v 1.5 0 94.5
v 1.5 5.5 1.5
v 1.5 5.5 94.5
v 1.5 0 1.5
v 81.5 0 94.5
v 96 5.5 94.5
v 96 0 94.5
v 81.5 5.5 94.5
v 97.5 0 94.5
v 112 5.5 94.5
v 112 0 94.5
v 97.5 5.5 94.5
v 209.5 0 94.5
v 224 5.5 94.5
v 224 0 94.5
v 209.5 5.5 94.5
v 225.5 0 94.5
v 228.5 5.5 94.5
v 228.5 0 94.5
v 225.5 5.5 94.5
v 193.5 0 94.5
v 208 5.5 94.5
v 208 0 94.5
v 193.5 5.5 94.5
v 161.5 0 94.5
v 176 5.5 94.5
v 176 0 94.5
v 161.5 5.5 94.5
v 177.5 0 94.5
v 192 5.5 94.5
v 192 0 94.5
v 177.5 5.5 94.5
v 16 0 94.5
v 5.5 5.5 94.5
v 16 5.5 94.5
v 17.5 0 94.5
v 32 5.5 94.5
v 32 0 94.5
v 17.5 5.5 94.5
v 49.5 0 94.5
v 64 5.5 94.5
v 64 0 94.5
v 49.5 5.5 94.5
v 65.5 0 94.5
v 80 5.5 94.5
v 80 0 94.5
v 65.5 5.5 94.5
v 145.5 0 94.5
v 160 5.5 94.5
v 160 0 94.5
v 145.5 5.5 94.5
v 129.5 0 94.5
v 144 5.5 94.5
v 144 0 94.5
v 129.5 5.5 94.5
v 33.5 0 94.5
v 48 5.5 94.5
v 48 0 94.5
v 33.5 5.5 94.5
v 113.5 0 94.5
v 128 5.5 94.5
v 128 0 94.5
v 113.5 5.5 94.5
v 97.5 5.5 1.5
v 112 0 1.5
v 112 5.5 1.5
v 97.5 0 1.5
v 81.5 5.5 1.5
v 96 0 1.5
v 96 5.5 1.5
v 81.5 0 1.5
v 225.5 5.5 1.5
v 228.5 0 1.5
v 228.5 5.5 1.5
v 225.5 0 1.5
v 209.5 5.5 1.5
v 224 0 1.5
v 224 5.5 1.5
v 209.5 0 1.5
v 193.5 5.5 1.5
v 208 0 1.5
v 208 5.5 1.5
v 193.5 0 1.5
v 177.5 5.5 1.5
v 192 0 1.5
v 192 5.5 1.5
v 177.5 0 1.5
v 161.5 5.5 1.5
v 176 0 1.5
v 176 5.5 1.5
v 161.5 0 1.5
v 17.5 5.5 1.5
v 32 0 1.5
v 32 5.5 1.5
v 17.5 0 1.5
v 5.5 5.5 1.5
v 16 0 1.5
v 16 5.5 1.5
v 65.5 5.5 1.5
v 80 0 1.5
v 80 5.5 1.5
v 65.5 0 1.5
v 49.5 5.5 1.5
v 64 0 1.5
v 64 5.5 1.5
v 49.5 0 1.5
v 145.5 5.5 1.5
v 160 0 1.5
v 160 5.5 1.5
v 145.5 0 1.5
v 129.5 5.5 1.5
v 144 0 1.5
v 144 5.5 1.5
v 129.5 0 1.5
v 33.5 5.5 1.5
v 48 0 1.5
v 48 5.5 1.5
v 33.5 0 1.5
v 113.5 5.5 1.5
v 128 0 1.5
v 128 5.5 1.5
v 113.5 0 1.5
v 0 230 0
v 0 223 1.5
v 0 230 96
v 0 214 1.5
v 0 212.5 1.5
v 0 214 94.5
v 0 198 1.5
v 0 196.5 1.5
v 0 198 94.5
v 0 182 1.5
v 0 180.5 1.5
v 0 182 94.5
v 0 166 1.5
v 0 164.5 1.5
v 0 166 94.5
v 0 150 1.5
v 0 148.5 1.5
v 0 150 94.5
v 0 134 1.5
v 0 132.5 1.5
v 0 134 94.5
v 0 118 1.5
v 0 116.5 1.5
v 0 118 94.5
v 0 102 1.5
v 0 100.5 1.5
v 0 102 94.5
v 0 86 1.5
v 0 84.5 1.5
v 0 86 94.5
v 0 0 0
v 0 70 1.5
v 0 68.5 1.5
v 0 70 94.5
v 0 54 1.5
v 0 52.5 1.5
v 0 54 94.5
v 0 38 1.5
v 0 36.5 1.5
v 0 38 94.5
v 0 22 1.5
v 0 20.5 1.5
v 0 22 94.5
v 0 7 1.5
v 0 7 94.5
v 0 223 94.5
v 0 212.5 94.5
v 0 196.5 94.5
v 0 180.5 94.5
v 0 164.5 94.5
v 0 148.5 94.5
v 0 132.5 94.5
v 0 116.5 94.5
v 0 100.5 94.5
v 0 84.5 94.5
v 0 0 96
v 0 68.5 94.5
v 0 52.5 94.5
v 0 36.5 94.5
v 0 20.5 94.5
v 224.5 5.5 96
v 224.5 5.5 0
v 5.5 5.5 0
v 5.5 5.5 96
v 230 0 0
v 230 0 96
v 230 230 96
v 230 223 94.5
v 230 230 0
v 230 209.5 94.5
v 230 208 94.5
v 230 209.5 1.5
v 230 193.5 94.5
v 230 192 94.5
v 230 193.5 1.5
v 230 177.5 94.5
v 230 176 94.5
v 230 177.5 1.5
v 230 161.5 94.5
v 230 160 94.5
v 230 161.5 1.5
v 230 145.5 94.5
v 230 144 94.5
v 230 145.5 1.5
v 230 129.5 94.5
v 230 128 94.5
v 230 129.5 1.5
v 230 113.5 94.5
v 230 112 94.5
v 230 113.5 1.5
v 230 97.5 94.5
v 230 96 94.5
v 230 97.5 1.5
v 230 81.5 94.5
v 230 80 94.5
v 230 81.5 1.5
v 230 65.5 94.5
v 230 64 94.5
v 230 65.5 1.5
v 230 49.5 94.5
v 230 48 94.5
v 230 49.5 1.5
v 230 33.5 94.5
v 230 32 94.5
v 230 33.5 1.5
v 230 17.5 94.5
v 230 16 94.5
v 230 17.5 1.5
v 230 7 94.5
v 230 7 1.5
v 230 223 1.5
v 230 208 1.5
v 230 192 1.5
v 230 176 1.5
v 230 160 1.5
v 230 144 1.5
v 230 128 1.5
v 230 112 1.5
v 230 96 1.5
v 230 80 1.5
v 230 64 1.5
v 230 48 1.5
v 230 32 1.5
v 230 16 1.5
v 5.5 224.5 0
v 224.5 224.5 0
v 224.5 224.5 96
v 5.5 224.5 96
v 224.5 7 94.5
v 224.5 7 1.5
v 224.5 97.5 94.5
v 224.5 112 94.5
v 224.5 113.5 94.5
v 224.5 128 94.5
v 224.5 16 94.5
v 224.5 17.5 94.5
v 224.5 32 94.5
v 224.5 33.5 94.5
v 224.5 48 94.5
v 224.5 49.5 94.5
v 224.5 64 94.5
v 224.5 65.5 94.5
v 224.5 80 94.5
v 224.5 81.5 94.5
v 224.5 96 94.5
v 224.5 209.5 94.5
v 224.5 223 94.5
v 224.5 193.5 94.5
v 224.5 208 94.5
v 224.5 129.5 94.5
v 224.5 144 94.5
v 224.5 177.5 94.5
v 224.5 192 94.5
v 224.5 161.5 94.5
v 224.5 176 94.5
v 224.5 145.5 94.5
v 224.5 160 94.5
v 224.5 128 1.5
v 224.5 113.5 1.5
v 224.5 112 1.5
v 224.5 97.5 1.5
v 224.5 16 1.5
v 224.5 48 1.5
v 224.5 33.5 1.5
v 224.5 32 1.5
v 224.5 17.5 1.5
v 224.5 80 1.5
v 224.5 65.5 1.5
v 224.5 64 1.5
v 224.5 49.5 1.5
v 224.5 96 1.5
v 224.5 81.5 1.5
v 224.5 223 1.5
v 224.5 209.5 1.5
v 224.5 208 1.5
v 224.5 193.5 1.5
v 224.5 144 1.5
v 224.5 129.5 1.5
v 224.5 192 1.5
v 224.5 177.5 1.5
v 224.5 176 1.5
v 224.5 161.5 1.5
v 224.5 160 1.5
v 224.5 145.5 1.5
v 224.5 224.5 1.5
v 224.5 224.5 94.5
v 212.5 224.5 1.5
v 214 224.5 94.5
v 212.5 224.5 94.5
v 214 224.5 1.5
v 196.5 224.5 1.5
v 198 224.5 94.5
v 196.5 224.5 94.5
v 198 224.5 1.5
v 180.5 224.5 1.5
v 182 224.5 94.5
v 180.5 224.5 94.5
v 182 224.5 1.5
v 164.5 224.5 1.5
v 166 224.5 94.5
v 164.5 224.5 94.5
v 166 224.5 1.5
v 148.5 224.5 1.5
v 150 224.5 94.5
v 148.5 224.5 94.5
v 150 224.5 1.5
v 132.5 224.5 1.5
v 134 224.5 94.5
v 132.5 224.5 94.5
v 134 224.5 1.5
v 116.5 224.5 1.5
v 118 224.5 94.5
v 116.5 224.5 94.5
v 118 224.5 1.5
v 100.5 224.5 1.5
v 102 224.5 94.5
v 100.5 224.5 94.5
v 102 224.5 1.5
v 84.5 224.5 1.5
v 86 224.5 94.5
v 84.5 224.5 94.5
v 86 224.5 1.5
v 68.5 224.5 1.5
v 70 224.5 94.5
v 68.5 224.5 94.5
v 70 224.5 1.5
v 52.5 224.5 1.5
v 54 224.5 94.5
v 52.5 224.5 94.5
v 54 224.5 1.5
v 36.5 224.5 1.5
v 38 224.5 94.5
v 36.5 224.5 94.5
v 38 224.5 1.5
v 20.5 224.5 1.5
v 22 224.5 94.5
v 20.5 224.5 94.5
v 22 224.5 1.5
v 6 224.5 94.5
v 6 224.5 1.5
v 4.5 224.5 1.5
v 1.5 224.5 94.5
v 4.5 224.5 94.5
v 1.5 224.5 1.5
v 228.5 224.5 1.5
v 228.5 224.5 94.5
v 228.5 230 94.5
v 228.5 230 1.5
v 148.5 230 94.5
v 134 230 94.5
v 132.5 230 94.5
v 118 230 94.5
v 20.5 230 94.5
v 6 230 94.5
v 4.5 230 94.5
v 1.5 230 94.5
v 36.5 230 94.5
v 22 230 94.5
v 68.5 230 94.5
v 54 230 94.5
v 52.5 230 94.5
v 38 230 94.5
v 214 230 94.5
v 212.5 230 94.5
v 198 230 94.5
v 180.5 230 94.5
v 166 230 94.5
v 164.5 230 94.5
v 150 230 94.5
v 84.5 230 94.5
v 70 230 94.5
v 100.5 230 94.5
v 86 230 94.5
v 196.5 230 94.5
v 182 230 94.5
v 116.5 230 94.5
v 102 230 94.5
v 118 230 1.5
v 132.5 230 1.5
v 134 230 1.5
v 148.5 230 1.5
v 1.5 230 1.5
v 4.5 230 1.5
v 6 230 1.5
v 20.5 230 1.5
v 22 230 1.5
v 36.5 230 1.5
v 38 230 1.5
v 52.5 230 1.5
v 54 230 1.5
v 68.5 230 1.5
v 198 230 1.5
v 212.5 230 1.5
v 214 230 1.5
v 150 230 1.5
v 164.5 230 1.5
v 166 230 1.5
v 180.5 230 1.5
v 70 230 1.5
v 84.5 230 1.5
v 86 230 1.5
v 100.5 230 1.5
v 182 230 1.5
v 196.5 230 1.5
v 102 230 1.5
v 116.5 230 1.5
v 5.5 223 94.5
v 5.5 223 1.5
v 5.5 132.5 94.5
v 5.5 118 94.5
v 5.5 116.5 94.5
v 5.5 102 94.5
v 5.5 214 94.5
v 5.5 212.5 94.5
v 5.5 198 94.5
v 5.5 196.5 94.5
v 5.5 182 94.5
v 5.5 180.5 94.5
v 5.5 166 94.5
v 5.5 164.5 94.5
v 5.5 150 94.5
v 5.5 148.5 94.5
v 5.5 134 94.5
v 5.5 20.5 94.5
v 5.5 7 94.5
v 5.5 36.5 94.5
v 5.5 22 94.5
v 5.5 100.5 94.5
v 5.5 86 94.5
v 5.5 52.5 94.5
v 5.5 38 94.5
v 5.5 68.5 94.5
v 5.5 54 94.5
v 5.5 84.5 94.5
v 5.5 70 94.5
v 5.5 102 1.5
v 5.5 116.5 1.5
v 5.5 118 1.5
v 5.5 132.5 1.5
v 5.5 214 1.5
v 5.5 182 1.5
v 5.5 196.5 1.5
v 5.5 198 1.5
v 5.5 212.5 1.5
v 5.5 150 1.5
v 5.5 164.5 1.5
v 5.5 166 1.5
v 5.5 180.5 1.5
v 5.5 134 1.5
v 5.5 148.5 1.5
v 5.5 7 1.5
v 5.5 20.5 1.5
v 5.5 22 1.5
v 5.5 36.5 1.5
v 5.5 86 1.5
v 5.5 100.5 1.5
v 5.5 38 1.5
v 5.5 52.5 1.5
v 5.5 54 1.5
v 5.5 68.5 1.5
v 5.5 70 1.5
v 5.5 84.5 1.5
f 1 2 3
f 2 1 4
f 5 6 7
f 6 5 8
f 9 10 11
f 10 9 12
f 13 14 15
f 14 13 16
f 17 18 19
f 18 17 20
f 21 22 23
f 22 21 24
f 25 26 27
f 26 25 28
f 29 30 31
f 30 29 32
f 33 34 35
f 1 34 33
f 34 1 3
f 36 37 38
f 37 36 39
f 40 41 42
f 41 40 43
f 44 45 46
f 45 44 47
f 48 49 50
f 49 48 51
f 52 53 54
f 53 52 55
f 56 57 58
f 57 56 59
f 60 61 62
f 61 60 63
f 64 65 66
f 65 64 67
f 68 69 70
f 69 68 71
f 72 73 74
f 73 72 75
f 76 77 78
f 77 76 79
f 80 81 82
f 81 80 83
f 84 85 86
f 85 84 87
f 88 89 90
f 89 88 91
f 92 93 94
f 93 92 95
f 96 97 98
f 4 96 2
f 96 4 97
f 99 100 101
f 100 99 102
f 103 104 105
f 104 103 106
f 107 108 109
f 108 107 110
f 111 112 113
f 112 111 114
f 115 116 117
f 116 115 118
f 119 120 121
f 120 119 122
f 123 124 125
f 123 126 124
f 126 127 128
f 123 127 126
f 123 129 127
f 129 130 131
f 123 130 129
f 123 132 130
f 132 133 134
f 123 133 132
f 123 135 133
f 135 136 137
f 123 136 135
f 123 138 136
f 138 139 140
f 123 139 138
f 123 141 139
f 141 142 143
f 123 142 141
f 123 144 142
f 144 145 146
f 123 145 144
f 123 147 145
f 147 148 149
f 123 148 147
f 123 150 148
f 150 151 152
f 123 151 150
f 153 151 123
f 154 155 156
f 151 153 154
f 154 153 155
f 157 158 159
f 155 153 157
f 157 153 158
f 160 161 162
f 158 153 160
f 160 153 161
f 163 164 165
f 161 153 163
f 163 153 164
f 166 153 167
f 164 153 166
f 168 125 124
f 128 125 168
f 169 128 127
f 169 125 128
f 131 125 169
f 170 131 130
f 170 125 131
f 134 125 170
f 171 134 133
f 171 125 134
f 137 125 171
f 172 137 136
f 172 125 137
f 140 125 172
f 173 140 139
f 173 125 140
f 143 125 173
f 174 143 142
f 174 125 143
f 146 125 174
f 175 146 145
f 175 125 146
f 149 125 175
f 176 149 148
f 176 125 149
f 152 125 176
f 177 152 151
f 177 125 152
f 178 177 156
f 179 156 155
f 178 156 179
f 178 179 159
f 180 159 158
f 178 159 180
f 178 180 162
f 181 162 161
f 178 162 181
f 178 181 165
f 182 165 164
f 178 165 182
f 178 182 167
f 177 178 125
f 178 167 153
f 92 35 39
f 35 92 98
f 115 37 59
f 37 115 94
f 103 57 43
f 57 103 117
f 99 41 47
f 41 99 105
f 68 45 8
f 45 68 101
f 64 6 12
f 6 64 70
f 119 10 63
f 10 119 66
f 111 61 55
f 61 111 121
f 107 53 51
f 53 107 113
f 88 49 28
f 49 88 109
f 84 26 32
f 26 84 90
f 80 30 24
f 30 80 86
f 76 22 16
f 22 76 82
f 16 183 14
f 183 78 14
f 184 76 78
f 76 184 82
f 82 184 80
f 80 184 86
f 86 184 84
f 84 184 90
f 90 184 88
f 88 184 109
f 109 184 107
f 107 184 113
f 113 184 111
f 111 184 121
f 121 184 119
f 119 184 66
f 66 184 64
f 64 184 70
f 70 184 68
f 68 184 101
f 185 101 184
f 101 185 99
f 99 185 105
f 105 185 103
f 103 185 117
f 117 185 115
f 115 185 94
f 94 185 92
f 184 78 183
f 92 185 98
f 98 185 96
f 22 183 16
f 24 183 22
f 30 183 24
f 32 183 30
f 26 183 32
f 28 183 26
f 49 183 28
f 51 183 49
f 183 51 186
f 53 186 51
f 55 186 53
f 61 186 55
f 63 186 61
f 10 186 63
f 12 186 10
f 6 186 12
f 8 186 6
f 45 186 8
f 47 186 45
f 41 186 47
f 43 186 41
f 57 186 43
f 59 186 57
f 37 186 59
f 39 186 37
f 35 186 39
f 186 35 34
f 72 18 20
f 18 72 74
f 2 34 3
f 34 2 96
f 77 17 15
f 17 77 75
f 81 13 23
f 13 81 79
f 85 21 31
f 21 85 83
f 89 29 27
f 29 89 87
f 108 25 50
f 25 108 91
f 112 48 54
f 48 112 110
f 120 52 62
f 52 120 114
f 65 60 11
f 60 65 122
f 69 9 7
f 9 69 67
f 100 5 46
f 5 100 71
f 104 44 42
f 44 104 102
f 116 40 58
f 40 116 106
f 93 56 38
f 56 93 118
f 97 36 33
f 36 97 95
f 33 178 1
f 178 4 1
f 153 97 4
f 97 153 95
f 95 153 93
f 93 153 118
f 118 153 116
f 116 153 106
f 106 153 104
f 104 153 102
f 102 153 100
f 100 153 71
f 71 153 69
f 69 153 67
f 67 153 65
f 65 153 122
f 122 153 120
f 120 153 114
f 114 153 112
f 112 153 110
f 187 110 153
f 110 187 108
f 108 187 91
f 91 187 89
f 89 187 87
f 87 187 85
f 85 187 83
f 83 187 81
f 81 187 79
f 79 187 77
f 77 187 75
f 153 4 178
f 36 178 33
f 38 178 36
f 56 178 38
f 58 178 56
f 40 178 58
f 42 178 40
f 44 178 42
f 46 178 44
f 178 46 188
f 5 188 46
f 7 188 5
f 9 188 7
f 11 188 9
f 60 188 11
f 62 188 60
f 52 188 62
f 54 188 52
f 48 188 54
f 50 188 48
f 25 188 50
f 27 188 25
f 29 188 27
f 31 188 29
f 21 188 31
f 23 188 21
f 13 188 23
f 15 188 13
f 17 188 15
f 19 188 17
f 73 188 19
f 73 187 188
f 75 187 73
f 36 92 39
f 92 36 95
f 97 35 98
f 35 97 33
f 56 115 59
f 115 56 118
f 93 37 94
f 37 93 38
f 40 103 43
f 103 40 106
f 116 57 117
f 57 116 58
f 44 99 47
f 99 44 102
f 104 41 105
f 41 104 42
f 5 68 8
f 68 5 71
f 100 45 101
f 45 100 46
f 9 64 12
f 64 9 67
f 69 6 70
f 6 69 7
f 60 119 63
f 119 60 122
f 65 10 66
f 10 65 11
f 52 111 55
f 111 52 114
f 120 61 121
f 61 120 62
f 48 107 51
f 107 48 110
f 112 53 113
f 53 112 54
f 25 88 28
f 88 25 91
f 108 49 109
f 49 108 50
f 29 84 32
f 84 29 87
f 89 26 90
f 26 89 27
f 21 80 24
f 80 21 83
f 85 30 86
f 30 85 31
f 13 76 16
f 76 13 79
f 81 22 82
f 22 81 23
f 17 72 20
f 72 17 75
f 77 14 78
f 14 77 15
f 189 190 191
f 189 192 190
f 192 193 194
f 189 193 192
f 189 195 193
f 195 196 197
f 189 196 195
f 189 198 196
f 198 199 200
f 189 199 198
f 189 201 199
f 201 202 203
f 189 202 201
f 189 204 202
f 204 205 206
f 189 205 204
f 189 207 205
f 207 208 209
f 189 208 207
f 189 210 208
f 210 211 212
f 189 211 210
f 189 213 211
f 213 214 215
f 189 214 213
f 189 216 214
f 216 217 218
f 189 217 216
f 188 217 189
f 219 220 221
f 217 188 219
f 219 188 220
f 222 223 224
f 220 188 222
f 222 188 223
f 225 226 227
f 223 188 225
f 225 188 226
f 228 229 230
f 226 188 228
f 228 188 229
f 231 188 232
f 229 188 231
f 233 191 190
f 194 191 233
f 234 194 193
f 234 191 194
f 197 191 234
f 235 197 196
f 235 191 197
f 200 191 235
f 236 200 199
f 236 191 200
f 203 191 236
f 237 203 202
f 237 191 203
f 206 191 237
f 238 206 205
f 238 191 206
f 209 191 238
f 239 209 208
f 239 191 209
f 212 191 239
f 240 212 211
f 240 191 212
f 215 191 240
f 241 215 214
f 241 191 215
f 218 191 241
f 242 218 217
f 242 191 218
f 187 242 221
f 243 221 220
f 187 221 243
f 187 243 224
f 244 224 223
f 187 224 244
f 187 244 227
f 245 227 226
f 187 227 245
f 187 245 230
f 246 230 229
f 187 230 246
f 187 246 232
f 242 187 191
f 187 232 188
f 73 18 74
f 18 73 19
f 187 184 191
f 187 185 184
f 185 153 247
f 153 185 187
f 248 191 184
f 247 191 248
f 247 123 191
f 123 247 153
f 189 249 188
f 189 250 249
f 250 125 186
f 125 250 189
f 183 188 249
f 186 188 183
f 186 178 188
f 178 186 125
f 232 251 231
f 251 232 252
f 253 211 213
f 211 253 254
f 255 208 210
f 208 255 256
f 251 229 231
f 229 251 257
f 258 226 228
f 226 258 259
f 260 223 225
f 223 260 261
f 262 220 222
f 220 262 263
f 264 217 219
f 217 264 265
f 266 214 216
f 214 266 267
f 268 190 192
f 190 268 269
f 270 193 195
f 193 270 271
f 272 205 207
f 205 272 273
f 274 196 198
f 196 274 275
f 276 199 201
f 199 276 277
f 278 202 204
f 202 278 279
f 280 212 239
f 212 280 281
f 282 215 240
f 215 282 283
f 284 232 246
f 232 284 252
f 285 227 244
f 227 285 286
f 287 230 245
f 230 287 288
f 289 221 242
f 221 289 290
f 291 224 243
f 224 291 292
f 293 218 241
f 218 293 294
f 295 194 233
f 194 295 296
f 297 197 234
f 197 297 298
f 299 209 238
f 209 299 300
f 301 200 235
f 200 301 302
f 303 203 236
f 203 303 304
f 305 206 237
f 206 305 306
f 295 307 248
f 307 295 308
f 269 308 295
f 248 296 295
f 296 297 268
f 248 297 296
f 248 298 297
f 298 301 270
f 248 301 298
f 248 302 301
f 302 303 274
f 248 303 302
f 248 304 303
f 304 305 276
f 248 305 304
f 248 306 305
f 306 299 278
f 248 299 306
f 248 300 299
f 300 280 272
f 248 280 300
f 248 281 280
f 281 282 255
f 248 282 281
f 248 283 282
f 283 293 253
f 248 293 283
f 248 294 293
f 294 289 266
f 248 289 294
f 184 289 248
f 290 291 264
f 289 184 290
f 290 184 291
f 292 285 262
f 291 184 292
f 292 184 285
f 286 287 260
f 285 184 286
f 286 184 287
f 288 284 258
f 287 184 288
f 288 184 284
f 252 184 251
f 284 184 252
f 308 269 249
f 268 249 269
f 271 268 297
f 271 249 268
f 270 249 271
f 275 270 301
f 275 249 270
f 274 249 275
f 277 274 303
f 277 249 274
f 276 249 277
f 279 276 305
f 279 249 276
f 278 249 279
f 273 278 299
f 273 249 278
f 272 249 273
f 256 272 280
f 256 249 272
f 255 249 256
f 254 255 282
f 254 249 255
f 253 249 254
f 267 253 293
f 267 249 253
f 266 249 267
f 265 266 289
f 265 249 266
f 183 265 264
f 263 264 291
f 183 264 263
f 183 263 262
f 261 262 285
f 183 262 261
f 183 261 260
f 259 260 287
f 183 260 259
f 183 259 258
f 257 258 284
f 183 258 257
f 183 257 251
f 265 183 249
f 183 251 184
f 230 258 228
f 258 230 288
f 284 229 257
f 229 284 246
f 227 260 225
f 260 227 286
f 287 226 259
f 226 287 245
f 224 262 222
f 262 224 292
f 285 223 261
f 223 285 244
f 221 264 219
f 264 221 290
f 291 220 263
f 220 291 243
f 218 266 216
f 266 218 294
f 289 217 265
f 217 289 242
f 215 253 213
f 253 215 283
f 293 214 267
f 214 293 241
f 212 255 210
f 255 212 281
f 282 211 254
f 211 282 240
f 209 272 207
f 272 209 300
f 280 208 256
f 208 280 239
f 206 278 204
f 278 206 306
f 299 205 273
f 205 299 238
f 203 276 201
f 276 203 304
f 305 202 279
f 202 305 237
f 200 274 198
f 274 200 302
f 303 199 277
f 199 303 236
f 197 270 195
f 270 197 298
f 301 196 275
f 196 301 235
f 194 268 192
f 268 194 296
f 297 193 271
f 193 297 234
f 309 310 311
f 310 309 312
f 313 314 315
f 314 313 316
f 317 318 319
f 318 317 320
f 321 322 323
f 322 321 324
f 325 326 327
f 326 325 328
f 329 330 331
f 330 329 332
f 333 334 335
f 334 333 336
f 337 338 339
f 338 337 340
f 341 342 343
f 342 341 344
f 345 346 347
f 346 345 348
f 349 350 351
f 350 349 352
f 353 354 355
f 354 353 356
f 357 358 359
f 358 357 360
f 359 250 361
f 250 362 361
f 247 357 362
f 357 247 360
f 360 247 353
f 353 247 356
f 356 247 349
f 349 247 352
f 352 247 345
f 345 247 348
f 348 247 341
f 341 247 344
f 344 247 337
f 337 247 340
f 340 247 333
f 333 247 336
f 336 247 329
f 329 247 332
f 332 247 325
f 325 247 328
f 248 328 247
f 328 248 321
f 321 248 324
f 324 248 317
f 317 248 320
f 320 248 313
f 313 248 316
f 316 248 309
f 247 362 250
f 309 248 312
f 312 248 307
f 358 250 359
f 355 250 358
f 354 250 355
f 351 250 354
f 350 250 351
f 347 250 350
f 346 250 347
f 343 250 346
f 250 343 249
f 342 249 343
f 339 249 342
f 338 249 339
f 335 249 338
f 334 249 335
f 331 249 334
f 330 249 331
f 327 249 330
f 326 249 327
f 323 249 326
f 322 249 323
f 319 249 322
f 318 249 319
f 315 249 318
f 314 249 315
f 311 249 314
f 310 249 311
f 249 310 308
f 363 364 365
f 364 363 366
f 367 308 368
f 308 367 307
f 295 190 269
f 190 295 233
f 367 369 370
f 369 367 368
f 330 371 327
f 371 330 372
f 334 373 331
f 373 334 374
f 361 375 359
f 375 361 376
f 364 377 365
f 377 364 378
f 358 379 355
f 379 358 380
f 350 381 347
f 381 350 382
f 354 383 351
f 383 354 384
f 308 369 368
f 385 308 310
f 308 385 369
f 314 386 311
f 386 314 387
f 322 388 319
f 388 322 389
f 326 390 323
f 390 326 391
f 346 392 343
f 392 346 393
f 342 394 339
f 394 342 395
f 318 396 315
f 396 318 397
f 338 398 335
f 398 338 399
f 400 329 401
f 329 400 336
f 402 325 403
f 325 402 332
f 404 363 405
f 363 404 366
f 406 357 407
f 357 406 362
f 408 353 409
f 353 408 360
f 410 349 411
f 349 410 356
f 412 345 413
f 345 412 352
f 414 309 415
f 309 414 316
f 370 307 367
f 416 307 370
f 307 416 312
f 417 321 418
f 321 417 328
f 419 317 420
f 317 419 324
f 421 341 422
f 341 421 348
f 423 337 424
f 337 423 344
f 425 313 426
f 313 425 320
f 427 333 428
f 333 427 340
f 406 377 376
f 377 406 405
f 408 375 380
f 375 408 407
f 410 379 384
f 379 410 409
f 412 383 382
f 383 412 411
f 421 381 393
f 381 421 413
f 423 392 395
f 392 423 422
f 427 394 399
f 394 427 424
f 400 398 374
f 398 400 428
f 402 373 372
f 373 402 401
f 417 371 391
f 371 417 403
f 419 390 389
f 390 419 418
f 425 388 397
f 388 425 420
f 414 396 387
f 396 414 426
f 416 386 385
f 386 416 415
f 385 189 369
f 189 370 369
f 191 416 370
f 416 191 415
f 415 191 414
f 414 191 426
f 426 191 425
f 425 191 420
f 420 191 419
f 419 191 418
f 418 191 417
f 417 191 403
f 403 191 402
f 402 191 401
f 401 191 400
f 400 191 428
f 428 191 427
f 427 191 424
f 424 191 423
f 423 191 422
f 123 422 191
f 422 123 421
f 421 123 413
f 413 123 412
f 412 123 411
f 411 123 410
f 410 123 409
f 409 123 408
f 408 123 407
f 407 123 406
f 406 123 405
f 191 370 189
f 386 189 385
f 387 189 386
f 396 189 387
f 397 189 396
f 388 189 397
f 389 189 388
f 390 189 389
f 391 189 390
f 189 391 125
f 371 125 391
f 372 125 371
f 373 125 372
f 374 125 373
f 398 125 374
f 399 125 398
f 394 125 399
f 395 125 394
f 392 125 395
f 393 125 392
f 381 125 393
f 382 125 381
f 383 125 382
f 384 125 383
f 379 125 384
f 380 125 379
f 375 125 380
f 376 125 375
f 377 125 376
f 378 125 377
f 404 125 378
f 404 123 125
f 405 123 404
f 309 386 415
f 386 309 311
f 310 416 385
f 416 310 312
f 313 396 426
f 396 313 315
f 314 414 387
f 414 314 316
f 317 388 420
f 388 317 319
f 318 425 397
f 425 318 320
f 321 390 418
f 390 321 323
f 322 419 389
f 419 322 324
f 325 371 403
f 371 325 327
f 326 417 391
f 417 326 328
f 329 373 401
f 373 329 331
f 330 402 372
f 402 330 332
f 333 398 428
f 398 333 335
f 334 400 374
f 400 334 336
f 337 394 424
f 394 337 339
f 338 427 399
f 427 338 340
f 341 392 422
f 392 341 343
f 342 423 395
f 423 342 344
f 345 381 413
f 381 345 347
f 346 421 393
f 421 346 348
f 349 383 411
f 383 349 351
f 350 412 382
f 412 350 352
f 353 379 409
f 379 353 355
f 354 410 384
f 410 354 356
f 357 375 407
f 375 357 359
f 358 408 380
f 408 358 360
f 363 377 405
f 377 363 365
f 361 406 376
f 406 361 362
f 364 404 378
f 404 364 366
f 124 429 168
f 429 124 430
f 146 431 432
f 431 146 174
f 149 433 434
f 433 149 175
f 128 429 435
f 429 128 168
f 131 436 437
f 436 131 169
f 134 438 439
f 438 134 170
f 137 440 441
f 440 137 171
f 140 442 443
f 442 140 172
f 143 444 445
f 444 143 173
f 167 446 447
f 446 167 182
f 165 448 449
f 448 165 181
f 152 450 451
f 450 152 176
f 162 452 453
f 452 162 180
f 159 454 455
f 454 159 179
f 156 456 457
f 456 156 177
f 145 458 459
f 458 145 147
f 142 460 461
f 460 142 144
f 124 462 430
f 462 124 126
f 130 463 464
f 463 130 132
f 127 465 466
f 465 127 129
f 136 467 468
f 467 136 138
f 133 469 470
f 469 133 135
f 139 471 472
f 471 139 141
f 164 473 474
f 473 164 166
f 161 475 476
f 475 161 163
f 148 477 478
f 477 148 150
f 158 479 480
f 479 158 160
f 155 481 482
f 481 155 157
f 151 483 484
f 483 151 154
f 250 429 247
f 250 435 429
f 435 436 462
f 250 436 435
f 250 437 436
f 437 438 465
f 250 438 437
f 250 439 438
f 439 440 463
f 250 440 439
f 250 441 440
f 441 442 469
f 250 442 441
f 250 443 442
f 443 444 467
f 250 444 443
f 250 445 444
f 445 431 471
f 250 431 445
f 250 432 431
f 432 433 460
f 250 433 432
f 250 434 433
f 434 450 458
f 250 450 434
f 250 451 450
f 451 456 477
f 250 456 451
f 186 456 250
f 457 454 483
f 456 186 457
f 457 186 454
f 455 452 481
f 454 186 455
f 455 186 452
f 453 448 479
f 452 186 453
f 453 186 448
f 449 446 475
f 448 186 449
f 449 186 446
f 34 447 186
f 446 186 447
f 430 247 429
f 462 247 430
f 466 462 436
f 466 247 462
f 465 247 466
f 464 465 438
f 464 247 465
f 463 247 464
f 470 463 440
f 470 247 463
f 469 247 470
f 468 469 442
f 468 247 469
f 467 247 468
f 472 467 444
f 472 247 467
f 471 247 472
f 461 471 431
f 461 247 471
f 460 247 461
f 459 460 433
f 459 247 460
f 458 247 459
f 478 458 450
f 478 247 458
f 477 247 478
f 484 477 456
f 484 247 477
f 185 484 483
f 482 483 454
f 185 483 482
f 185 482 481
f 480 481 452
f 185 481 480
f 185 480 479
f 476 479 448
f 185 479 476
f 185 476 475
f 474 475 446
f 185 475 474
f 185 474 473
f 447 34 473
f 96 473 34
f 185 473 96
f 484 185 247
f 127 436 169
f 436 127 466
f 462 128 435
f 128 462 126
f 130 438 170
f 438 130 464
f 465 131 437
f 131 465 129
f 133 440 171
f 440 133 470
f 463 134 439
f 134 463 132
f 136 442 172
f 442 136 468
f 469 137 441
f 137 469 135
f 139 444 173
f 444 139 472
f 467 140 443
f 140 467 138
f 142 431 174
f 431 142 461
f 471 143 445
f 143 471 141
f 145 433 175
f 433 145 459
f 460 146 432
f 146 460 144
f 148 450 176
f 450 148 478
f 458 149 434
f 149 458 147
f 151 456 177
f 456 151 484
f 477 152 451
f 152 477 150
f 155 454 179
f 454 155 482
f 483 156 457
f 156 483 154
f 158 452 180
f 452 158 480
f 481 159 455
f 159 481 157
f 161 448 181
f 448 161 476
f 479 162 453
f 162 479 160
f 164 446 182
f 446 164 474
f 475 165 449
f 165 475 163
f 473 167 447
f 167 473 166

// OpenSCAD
$fn = 48;

color(c = [0.8500000000, 0.7000000000, 0.4500000000]) {
	translate(v = [0, 0, 0]) {
		rotate(a = 0) {
			translate(v = [0, 0, 1.5000000000]) {
				cube(size = [1.5000000000, 5.5000000000, 93.0000000000]);
			}
			translate(v = [16, 0, 1.5000000000]) {
				cube(size = [1.5000000000, 5.5000000000, 93.0000000000]);
			}
			translate(v = [32, 0, 1.5000000000]) {
				cube(size = [1.5000000000, 5.5000000000, 93.0000000000]);
			}
			translate(v = [48, 0, 1.5000000000]) {
				cube(size = [1.5000000000, 5.5000000000, 93.0000000000]);
			}
			translate(v = [64, 0, 1.5000000000]) {
				cube(size = [1.5000000000, 5.5000000000, 93.0000000000]);
			}
			translate(v = [80, 0, 1.5000000000]) {
				cube(size = [1.5000000000, 5.5000000000, 93.0000000000]);
			}
			translate(v = [96, 0, 1.5000000000]) {
				cube(size = [1.5000000000, 5.5000000000, 93.0000000000]);
			}
			translate(v = [112, 0, 1.5000000000]) {
				cube(size = [1.5000000000, 5.5000000000, 93.0000000000]);
			}
			translate(v = [128, 0, 1.5000000000]) {
				cube(size = [1.5000000000, 5.5000000000, 93.0000000000]);
			}
			translate(v = [144, 0, 1.5000000000]) {
				cube(size = [1.5000000000, 5.5000000000, 93.0000000000]);
			}
			translate(v = [160, 0, 1.5000000000]) {
				cube(size = [1.5000000000, 5.5000000000, 93.0000000000]);
			}
			translate(v = [176, 0, 1.5000000000]) {
				cube(size = [1.5000000000, 5.5000000000, 93.0000000000]);
			}
			translate(v = [192, 0, 1.5000000000]) {
				cube(size = [1.5000000000, 5.5000000000, 93.0000000000]);
			}
			translate(v = [208, 0, 1.5000000000]) {
				cube(size = [1.5000000000, 5.5000000000, 93.0000000000]);
			}
			translate(v = [224, 0, 1.5000000000]) {
				cube(size = [1.5000000000, 5.5000000000, 93.0000000000]);
			}
			translate(v = [228.5000000000, 0, 1.5000000000]) {
				cube(size = [1.5000000000, 5.5000000000, 93.0000000000]);
			}
			translate(v = [0.0000000000, 0, 0]) {
				cube(size = [230.0000000000, 5.5000000000, 1.5000000000]);
			}
			translate(v = [0.0000000000, 0, 94.5000000000]) {
				cube(size = [230.0000000000, 5.5000000000, 1.5000000000]);
			}
		}
	}
}
color(c = [0.8500000000, 0.7000000000, 0.4500000000]) {
	translate(v = [230, 0, 0]) {
		rotate(a = 90) {
			translate(v = [5.5000000000, 0, 1.5000000000]) {
				cube(size = [1.5000000000, 5.5000000000, 93.0000000000]);
			}
			translate(v = [16, 0, 1.5000000000]) {
				cube(size = [1.5000000000, 5.5000000000, 93.0000000000]);
			}
			translate(v = [32, 0, 1.5000000000]) {
				cube(size = [1.5000000000, 5.5000000000, 93.0000000000]);
			}
			translate(v = [48, 0, 1.5000000000]) {
				cube(size = [1.5000000000, 5.5000000000, 93.0000000000]);
			}
			translate(v = [64, 0, 1.5000000000]) {
				cube(size = [1.5000000000, 5.5000000000, 93.0000000000]);
			}
			translate(v = [80, 0, 1.5000000000]) {
				cube(size = [1.5000000000, 5.5000000000, 93.0000000000]);
			}
			translate(v = [96, 0, 1.5000000000]) {
				cube(size = [1.5000000000, 5.5000000000, 93.0000000000]);
			}
			translate(v = [112, 0, 1.5000000000]) {
				cube(size = [1.5000000000, 5.5000000000, 93.0000000000]);
			}
			translate(v = [128, 0, 1.5000000000]) {
				cube(size = [1.5000000000, 5.5000000000, 93.0000000000]);
			}
			translate(v = [144, 0, 1.5000000000]) {
				cube(size = [1.5000000000, 5.5000000000, 93.0000000000]);
			}
			translate(v = [160, 0, 1.5000000000]) {
				cube(size = [1.5000000000, 5.5000000000, 93.0000000000]);
			}
			translate(v = [176, 0, 1.5000000000]) {
				cube(size = [1.5000000000, 5.5000000000, 93.0000000000]);
			}
			translate(v = [192, 0, 1.5000000000]) {
				cube(size = [1.5000000000, 5.5000000000, 93.0000000000]);
			}
			translate(v = [208, 0, 1.5000000000]) {
				cube(size = [1.5000000000, 5.5000000000, 93.0000000000]);
			}
			translate(v = [223.0000000000, 0, 1.5000000000]) {
				cube(size = [1.5000000000, 5.5000000000, 93.0000000000]);
			}
			translate(v = [5.5000000000, 0, 0]) {
				cube(size = [219.0000000000, 5.5000000000, 1.5000000000]);
			}
			translate(v = [5.5000000000, 0, 94.5000000000]) {
				cube(size = [219.0000000000, 5.5000000000, 1.5000000000]);
			}
		}
	}
}
color(c = [0.8500000000, 0.7000000000, 0.4500000000]) {
	translate(v = [230, 230, 0]) {
		rotate(a = 180) {
			translate(v = [0, 0, 1.5000000000]) {
				cube(size = [1.5000000000, 5.5000000000, 93.0000000000]);
			}
			translate(v = [16, 0, 1.5000000000]) {
				cube(size = [1.5000000000, 5.5000000000, 93.0000000000]);
			}
			translate(v = [32, 0, 1.5000000000]) {
				cube(size = [1.5000000000, 5.5000000000, 93.0000000000]);
			}
			translate(v = [48, 0, 1.5000000000]) {
				cube(size = [1.5000000000, 5.5000000000, 93.0000000000]);
			}
			translate(v = [64, 0, 1.5000000000]) {
				cube(size = [1.5000000000, 5.5000000000, 93.0000000000]);
			}
			translate(v = [80, 0, 1.5000000000]) {
				cube(size = [1.5000000000, 5.5000000000, 93.0000000000]);
			}
			translate(v = [96, 0, 1.5000000000]) {
				cube(size = [1.5000000000, 5.5000000000, 93.0000000000]);
			}
			translate(v = [112, 0, 1.5000000000]) {
				cube(size = [1.5000000000, 5.5000000000, 93.0000000000]);
			}
			translate(v = [128, 0, 1.5000000000]) {
				cube(size = [1.5000000000, 5.5000000000, 93.0000000000]);
			}
			translate(v = [144, 0, 1.5000000000]) {
				cube(size = [1.5000000000, 5.5000000000, 93.0000000000]);
			}
			translate(v = [160, 0, 1.5000000000]) {
				cube(size = [1.5000000000, 5.5000000000, 93.0000000000]);
			}
			translate(v = [176, 0, 1.5000000000]) {
				cube(size = [1.5000000000, 5.5000000000, 93.0000000000]);
			}
			translate(v = [192, 0, 1.5000000000]) {
				cube(size = [1.5000000000, 5.5000000000, 93.0000000000]);
			}
			translate(v = [208, 0, 1.5000000000]) {
				cube(size = [1.5000000000, 5.5000000000, 93.0000000000]);
			}
			translate(v = [224, 0, 1.5000000000]) {
				cube(size = [1.5000000000, 5.5000000000, 93.0000000000]);
			}
			translate(v = [228.5000000000, 0, 1.5000000000]) {
				cube(size = [1.5000000000, 5.5000000000, 93.0000000000]);
			}
			translate(v = [0.0000000000, 0, 0]) {
				cube(size = [230.0000000000, 5.5000000000, 1.5000000000]);
			}
			translate(v = [0.0000000000, 0, 94.5000000000]) {
				cube(size = [230.0000000000, 5.5000000000, 1.5000000000]);
			}
		}
	}
}
color(c = [0.8500000000, 0.7000000000, 0.4500000000]) {
	translate(v = [0, 230, 0]) {
		rotate(a = 270) {
			translate(v = [5.5000000000, 0, 1.5000000000]) {
				cube(size = [1.5000000000, 5.5000000000, 93.0000000000]);
			}
			translate(v = [16, 0, 1.5000000000]) {
				cube(size = [1.5000000000, 5.5000000000, 93.0000000000]);
			}
			translate(v = [32, 0, 1.5000000000]) {
				cube(size = [1.5000000000, 5.5000000000, 93.0000000000]);
			}
			translate(v = [48, 0, 1.5000000000]) {
				cube(size = [1.5000000000, 5.5000000000, 93.0000000000]);
			}
			translate(v = [64, 0, 1.5000000000]) {
				cube(size = [1.5000000000, 5.5000000000, 93.0000000000]);
			}
			translate(v = [80, 0, 1.5000000000]) {
				cube(size = [1.5000000000, 5.5000000000, 93.0000000000]);
			}
			translate(v = [96, 0, 1.5000000000]) {
				cube(size = [1.5000000000, 5.5000000000, 93.0000000000]);
			}
			translate(v = [112, 0, 1.5000000000]) {
				cube(size = [1.5000000000, 5.5000000000, 93.0000000000]);
			}
			translate(v = [128, 0, 1.5000000000]) {
				cube(size = [1.5000000000, 5.5000000000, 93.0000000000]);
			}
			translate(v = [144, 0, 1.5000000000]) {
				cube(size = [1.5000000000, 5.5000000000, 93.0000000000]);
			}
			translate(v = [160, 0, 1.5000000000]) {
				cube(size = [1.5000000000, 5.5000000000, 93.0000000000]);
			}
			translate(v = [176, 0, 1.5000000000]) {
				cube(size = [1.5000000000, 5.5000000000, 93.0000000000]);
			}
			translate(v = [192, 0, 1.5000000000]) {
				cube(size = [1.5000000000, 5.5000000000, 93.0000000000]);
			}
			translate(v = [208, 0, 1.5000000000]) {
				cube(size = [1.5000000000, 5.5000000000, 93.0000000000]);
			}
			translate(v = [223.0000000000, 0, 1.5000000000]) {
				cube(size = [1.5000000000, 5.5000000000, 93.0000000000]);
			}
			translate(v = [5.5000000000, 0, 0]) {
				cube(size = [219.0000000000, 5.5000000000, 1.5000000000]);
			}
			translate(v = [5.5000000000, 0, 94.5000000000]) {
				cube(size = [219.0000000000, 5.5000000000, 1.5000000000]);
			}
		}
	}
}
